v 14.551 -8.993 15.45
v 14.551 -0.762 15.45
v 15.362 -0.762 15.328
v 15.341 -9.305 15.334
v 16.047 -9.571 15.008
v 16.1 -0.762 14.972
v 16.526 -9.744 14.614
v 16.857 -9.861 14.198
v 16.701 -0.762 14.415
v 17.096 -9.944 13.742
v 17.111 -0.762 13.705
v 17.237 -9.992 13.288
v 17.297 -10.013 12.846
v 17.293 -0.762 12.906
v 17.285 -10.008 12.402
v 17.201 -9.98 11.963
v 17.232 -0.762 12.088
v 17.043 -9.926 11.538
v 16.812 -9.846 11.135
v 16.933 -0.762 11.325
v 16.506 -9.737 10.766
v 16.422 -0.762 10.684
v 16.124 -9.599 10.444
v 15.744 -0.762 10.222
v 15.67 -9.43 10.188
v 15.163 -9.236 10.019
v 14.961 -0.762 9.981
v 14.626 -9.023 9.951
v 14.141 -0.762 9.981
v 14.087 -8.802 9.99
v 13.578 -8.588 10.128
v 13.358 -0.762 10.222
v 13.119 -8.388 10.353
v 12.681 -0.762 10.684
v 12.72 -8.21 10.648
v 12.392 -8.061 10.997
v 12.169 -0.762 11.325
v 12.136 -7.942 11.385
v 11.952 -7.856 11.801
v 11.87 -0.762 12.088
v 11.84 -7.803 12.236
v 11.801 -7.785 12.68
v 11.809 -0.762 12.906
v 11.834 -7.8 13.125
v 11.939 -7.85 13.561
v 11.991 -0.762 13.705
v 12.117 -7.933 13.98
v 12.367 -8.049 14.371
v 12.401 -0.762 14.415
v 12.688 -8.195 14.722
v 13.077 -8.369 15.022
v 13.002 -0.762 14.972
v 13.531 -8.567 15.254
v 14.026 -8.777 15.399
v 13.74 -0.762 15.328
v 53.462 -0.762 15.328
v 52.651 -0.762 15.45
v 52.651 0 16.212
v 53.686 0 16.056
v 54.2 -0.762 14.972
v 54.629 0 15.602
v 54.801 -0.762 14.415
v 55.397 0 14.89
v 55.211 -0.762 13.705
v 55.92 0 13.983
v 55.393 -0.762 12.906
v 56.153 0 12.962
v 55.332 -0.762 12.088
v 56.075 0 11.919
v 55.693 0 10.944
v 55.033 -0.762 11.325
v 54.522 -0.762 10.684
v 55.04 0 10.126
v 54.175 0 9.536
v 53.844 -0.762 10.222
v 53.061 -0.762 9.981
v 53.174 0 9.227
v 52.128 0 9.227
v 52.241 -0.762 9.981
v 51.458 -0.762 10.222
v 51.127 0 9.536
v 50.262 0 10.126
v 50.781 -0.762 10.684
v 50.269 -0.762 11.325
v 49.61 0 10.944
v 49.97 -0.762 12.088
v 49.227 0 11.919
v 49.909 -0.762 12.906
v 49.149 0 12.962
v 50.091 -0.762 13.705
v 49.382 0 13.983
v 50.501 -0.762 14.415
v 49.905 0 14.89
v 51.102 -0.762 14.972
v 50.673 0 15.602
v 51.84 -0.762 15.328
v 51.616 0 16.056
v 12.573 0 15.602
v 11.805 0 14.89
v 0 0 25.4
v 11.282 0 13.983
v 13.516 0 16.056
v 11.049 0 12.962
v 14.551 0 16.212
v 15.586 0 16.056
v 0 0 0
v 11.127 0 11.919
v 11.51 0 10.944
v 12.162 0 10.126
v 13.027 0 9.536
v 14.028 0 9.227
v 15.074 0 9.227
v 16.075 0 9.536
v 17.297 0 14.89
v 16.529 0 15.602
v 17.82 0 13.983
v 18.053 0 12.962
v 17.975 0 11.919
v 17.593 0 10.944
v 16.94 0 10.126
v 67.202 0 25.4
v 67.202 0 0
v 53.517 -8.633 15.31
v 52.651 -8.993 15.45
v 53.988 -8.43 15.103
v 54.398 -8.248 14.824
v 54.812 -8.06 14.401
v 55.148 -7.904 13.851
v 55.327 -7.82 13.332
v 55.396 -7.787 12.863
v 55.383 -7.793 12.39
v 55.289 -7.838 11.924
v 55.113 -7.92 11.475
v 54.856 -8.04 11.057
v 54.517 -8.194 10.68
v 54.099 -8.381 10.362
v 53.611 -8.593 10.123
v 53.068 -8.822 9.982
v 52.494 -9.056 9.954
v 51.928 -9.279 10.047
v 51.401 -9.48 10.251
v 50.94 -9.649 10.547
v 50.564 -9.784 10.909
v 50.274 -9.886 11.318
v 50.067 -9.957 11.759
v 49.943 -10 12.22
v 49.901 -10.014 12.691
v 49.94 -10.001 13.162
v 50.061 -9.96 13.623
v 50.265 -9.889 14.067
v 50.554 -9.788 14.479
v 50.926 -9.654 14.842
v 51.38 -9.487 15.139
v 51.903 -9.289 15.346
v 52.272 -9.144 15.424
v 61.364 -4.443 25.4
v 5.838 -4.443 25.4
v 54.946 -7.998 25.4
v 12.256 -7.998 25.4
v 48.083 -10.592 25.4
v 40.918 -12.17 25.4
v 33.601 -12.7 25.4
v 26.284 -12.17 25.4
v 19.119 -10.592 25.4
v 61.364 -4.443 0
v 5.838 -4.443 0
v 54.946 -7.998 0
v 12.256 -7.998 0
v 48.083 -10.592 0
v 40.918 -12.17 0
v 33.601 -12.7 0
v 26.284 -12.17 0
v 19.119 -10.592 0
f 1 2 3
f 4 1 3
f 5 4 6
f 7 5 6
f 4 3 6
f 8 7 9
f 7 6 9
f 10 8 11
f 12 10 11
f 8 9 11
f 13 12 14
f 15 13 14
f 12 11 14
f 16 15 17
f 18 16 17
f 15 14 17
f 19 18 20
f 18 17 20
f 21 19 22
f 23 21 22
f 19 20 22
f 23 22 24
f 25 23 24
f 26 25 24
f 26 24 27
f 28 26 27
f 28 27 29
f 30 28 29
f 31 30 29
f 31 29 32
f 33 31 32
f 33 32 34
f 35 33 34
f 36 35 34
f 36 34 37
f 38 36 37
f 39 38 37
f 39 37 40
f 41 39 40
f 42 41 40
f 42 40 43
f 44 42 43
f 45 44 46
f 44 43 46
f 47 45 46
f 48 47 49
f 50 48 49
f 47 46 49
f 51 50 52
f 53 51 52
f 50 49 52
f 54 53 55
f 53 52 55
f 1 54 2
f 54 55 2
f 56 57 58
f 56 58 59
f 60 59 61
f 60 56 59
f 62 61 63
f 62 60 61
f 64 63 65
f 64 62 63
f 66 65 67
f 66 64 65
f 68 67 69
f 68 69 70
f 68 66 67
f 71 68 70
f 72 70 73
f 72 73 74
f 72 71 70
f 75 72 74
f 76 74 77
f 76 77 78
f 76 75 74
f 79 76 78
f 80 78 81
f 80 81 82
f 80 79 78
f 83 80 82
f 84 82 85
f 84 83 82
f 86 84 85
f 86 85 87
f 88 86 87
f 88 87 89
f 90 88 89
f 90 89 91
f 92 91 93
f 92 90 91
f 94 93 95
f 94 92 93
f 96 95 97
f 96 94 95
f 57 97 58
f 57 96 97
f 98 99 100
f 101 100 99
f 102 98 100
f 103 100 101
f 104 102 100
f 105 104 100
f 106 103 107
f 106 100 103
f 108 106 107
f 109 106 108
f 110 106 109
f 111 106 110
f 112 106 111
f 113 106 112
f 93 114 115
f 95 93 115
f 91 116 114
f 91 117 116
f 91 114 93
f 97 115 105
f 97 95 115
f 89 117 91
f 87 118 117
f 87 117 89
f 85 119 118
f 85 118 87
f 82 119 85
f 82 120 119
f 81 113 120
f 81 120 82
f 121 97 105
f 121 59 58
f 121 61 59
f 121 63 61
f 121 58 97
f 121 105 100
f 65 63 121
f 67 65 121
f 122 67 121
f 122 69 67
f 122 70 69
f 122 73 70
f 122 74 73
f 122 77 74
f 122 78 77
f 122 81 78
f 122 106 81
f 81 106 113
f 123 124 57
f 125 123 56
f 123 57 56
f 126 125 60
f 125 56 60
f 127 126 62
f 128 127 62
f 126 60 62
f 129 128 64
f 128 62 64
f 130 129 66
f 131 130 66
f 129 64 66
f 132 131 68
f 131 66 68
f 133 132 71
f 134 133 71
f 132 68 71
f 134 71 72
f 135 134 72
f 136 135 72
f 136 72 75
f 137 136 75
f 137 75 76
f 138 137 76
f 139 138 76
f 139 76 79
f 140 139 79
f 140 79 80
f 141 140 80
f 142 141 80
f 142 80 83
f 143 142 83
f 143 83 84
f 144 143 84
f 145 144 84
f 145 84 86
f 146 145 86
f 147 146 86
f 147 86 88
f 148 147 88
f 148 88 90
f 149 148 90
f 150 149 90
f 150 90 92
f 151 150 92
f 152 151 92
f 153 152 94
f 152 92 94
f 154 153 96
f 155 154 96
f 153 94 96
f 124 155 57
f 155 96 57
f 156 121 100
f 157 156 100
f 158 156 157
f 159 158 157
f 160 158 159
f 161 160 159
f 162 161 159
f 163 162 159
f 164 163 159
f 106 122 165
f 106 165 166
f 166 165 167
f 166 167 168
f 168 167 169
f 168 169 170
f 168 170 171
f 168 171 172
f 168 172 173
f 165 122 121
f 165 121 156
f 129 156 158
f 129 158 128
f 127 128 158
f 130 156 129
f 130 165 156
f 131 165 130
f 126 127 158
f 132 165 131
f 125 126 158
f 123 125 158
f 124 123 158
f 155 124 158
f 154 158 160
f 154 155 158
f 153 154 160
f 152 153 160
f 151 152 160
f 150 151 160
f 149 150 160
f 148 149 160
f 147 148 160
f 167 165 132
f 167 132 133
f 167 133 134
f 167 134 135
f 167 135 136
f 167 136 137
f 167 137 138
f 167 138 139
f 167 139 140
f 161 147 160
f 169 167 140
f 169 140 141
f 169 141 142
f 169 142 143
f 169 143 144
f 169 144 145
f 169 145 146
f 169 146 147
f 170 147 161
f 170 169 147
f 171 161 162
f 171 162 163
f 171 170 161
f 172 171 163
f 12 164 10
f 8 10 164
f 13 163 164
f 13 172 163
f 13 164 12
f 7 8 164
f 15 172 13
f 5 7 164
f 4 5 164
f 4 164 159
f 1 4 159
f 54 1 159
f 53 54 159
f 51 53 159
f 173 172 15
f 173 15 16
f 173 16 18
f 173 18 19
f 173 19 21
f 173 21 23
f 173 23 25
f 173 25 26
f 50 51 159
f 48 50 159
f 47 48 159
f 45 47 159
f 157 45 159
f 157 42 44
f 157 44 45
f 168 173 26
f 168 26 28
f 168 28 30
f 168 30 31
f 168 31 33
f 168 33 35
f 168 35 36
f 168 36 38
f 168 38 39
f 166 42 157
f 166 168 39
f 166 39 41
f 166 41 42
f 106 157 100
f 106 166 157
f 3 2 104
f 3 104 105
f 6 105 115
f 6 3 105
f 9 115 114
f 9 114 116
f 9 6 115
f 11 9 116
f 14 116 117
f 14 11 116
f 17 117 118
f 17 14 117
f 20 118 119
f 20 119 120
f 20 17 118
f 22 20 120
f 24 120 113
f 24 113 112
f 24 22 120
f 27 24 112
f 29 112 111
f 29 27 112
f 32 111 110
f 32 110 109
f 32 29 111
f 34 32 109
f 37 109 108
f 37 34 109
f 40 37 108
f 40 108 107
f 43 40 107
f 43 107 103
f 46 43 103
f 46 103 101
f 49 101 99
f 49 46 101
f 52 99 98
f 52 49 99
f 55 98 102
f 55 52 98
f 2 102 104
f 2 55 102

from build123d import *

# Parameters (mm, degrees)
BOSS_EXTRUDE1_DEPTH     = 25.4
CUT_EXTRUDE1_DEPTH      = 73.955945611
CUT_EXTRUDE1_DEPTH_BACK = 73.955945611
SKETCH2_R               = 2
SKETCH3_R               = 2.75
CUT_EXTRUDE2_DEPTH      = 73.955945755
CHAMFER1_SIZE           = 0.762


with BuildPart() as part:
    # Sketch1 → Boss-Extrude1 (new body)
    with BuildSketch(Plane.XY):
        with BuildLine():
            Line((0, 0), (67.202083301, 0))
            ThreePointArc((67.202083301, 0), (33.601041651, -12.7), (0, 0))
        make_face()
    extrude(amount=BOSS_EXTRUDE1_DEPTH)

    # Sketch2 → Cut-Extrude1 (cut, two sides: drawn at the far end of the back side and taken through both)
    with BuildSketch(Plane(origin=(0, 0, 0), x_dir=(1, 0, 0), z_dir=(0, 1, 0)).offset(-CUT_EXTRUDE1_DEPTH_BACK)):
        with Locations(Location((14.551041651, -12.7, 0), (0, 0, 270))):
            Circle(SKETCH2_R)
        with Locations(Location((52.651041651, -12.7, 0), (0, 0, 270))):
            Circle(SKETCH2_R)
    extrude(amount=CUT_EXTRUDE1_DEPTH + CUT_EXTRUDE1_DEPTH_BACK, mode=Mode.SUBTRACT)

    # Sketch3 → Cut-Extrude2 (cut, through all)
    with BuildSketch(Plane(origin=(0, 0, 0), x_dir=(1, 0, 0), z_dir=(0, 1, 0))):
        with Locations(Location((14.551041651, -12.7, 0), (0, 0, 270))):
            Circle(SKETCH3_R)
        with Locations(Location((52.651041651, -12.7, 0), (0, 0, 270))):
            Circle(SKETCH3_R)
    extrude(amount=-CUT_EXTRUDE2_DEPTH, mode=Mode.SUBTRACT)

    # Chamfer1
    chamfer1_edges = [part.edges().sort_by_distance(p)[0] for p in [
        (14.551041651, 0, 9.95),
        (52.651041651, 0, 9.95),
    ]]
    chamfer(chamfer1_edges, length=CHAMFER1_SIZE)


solid = part.part
